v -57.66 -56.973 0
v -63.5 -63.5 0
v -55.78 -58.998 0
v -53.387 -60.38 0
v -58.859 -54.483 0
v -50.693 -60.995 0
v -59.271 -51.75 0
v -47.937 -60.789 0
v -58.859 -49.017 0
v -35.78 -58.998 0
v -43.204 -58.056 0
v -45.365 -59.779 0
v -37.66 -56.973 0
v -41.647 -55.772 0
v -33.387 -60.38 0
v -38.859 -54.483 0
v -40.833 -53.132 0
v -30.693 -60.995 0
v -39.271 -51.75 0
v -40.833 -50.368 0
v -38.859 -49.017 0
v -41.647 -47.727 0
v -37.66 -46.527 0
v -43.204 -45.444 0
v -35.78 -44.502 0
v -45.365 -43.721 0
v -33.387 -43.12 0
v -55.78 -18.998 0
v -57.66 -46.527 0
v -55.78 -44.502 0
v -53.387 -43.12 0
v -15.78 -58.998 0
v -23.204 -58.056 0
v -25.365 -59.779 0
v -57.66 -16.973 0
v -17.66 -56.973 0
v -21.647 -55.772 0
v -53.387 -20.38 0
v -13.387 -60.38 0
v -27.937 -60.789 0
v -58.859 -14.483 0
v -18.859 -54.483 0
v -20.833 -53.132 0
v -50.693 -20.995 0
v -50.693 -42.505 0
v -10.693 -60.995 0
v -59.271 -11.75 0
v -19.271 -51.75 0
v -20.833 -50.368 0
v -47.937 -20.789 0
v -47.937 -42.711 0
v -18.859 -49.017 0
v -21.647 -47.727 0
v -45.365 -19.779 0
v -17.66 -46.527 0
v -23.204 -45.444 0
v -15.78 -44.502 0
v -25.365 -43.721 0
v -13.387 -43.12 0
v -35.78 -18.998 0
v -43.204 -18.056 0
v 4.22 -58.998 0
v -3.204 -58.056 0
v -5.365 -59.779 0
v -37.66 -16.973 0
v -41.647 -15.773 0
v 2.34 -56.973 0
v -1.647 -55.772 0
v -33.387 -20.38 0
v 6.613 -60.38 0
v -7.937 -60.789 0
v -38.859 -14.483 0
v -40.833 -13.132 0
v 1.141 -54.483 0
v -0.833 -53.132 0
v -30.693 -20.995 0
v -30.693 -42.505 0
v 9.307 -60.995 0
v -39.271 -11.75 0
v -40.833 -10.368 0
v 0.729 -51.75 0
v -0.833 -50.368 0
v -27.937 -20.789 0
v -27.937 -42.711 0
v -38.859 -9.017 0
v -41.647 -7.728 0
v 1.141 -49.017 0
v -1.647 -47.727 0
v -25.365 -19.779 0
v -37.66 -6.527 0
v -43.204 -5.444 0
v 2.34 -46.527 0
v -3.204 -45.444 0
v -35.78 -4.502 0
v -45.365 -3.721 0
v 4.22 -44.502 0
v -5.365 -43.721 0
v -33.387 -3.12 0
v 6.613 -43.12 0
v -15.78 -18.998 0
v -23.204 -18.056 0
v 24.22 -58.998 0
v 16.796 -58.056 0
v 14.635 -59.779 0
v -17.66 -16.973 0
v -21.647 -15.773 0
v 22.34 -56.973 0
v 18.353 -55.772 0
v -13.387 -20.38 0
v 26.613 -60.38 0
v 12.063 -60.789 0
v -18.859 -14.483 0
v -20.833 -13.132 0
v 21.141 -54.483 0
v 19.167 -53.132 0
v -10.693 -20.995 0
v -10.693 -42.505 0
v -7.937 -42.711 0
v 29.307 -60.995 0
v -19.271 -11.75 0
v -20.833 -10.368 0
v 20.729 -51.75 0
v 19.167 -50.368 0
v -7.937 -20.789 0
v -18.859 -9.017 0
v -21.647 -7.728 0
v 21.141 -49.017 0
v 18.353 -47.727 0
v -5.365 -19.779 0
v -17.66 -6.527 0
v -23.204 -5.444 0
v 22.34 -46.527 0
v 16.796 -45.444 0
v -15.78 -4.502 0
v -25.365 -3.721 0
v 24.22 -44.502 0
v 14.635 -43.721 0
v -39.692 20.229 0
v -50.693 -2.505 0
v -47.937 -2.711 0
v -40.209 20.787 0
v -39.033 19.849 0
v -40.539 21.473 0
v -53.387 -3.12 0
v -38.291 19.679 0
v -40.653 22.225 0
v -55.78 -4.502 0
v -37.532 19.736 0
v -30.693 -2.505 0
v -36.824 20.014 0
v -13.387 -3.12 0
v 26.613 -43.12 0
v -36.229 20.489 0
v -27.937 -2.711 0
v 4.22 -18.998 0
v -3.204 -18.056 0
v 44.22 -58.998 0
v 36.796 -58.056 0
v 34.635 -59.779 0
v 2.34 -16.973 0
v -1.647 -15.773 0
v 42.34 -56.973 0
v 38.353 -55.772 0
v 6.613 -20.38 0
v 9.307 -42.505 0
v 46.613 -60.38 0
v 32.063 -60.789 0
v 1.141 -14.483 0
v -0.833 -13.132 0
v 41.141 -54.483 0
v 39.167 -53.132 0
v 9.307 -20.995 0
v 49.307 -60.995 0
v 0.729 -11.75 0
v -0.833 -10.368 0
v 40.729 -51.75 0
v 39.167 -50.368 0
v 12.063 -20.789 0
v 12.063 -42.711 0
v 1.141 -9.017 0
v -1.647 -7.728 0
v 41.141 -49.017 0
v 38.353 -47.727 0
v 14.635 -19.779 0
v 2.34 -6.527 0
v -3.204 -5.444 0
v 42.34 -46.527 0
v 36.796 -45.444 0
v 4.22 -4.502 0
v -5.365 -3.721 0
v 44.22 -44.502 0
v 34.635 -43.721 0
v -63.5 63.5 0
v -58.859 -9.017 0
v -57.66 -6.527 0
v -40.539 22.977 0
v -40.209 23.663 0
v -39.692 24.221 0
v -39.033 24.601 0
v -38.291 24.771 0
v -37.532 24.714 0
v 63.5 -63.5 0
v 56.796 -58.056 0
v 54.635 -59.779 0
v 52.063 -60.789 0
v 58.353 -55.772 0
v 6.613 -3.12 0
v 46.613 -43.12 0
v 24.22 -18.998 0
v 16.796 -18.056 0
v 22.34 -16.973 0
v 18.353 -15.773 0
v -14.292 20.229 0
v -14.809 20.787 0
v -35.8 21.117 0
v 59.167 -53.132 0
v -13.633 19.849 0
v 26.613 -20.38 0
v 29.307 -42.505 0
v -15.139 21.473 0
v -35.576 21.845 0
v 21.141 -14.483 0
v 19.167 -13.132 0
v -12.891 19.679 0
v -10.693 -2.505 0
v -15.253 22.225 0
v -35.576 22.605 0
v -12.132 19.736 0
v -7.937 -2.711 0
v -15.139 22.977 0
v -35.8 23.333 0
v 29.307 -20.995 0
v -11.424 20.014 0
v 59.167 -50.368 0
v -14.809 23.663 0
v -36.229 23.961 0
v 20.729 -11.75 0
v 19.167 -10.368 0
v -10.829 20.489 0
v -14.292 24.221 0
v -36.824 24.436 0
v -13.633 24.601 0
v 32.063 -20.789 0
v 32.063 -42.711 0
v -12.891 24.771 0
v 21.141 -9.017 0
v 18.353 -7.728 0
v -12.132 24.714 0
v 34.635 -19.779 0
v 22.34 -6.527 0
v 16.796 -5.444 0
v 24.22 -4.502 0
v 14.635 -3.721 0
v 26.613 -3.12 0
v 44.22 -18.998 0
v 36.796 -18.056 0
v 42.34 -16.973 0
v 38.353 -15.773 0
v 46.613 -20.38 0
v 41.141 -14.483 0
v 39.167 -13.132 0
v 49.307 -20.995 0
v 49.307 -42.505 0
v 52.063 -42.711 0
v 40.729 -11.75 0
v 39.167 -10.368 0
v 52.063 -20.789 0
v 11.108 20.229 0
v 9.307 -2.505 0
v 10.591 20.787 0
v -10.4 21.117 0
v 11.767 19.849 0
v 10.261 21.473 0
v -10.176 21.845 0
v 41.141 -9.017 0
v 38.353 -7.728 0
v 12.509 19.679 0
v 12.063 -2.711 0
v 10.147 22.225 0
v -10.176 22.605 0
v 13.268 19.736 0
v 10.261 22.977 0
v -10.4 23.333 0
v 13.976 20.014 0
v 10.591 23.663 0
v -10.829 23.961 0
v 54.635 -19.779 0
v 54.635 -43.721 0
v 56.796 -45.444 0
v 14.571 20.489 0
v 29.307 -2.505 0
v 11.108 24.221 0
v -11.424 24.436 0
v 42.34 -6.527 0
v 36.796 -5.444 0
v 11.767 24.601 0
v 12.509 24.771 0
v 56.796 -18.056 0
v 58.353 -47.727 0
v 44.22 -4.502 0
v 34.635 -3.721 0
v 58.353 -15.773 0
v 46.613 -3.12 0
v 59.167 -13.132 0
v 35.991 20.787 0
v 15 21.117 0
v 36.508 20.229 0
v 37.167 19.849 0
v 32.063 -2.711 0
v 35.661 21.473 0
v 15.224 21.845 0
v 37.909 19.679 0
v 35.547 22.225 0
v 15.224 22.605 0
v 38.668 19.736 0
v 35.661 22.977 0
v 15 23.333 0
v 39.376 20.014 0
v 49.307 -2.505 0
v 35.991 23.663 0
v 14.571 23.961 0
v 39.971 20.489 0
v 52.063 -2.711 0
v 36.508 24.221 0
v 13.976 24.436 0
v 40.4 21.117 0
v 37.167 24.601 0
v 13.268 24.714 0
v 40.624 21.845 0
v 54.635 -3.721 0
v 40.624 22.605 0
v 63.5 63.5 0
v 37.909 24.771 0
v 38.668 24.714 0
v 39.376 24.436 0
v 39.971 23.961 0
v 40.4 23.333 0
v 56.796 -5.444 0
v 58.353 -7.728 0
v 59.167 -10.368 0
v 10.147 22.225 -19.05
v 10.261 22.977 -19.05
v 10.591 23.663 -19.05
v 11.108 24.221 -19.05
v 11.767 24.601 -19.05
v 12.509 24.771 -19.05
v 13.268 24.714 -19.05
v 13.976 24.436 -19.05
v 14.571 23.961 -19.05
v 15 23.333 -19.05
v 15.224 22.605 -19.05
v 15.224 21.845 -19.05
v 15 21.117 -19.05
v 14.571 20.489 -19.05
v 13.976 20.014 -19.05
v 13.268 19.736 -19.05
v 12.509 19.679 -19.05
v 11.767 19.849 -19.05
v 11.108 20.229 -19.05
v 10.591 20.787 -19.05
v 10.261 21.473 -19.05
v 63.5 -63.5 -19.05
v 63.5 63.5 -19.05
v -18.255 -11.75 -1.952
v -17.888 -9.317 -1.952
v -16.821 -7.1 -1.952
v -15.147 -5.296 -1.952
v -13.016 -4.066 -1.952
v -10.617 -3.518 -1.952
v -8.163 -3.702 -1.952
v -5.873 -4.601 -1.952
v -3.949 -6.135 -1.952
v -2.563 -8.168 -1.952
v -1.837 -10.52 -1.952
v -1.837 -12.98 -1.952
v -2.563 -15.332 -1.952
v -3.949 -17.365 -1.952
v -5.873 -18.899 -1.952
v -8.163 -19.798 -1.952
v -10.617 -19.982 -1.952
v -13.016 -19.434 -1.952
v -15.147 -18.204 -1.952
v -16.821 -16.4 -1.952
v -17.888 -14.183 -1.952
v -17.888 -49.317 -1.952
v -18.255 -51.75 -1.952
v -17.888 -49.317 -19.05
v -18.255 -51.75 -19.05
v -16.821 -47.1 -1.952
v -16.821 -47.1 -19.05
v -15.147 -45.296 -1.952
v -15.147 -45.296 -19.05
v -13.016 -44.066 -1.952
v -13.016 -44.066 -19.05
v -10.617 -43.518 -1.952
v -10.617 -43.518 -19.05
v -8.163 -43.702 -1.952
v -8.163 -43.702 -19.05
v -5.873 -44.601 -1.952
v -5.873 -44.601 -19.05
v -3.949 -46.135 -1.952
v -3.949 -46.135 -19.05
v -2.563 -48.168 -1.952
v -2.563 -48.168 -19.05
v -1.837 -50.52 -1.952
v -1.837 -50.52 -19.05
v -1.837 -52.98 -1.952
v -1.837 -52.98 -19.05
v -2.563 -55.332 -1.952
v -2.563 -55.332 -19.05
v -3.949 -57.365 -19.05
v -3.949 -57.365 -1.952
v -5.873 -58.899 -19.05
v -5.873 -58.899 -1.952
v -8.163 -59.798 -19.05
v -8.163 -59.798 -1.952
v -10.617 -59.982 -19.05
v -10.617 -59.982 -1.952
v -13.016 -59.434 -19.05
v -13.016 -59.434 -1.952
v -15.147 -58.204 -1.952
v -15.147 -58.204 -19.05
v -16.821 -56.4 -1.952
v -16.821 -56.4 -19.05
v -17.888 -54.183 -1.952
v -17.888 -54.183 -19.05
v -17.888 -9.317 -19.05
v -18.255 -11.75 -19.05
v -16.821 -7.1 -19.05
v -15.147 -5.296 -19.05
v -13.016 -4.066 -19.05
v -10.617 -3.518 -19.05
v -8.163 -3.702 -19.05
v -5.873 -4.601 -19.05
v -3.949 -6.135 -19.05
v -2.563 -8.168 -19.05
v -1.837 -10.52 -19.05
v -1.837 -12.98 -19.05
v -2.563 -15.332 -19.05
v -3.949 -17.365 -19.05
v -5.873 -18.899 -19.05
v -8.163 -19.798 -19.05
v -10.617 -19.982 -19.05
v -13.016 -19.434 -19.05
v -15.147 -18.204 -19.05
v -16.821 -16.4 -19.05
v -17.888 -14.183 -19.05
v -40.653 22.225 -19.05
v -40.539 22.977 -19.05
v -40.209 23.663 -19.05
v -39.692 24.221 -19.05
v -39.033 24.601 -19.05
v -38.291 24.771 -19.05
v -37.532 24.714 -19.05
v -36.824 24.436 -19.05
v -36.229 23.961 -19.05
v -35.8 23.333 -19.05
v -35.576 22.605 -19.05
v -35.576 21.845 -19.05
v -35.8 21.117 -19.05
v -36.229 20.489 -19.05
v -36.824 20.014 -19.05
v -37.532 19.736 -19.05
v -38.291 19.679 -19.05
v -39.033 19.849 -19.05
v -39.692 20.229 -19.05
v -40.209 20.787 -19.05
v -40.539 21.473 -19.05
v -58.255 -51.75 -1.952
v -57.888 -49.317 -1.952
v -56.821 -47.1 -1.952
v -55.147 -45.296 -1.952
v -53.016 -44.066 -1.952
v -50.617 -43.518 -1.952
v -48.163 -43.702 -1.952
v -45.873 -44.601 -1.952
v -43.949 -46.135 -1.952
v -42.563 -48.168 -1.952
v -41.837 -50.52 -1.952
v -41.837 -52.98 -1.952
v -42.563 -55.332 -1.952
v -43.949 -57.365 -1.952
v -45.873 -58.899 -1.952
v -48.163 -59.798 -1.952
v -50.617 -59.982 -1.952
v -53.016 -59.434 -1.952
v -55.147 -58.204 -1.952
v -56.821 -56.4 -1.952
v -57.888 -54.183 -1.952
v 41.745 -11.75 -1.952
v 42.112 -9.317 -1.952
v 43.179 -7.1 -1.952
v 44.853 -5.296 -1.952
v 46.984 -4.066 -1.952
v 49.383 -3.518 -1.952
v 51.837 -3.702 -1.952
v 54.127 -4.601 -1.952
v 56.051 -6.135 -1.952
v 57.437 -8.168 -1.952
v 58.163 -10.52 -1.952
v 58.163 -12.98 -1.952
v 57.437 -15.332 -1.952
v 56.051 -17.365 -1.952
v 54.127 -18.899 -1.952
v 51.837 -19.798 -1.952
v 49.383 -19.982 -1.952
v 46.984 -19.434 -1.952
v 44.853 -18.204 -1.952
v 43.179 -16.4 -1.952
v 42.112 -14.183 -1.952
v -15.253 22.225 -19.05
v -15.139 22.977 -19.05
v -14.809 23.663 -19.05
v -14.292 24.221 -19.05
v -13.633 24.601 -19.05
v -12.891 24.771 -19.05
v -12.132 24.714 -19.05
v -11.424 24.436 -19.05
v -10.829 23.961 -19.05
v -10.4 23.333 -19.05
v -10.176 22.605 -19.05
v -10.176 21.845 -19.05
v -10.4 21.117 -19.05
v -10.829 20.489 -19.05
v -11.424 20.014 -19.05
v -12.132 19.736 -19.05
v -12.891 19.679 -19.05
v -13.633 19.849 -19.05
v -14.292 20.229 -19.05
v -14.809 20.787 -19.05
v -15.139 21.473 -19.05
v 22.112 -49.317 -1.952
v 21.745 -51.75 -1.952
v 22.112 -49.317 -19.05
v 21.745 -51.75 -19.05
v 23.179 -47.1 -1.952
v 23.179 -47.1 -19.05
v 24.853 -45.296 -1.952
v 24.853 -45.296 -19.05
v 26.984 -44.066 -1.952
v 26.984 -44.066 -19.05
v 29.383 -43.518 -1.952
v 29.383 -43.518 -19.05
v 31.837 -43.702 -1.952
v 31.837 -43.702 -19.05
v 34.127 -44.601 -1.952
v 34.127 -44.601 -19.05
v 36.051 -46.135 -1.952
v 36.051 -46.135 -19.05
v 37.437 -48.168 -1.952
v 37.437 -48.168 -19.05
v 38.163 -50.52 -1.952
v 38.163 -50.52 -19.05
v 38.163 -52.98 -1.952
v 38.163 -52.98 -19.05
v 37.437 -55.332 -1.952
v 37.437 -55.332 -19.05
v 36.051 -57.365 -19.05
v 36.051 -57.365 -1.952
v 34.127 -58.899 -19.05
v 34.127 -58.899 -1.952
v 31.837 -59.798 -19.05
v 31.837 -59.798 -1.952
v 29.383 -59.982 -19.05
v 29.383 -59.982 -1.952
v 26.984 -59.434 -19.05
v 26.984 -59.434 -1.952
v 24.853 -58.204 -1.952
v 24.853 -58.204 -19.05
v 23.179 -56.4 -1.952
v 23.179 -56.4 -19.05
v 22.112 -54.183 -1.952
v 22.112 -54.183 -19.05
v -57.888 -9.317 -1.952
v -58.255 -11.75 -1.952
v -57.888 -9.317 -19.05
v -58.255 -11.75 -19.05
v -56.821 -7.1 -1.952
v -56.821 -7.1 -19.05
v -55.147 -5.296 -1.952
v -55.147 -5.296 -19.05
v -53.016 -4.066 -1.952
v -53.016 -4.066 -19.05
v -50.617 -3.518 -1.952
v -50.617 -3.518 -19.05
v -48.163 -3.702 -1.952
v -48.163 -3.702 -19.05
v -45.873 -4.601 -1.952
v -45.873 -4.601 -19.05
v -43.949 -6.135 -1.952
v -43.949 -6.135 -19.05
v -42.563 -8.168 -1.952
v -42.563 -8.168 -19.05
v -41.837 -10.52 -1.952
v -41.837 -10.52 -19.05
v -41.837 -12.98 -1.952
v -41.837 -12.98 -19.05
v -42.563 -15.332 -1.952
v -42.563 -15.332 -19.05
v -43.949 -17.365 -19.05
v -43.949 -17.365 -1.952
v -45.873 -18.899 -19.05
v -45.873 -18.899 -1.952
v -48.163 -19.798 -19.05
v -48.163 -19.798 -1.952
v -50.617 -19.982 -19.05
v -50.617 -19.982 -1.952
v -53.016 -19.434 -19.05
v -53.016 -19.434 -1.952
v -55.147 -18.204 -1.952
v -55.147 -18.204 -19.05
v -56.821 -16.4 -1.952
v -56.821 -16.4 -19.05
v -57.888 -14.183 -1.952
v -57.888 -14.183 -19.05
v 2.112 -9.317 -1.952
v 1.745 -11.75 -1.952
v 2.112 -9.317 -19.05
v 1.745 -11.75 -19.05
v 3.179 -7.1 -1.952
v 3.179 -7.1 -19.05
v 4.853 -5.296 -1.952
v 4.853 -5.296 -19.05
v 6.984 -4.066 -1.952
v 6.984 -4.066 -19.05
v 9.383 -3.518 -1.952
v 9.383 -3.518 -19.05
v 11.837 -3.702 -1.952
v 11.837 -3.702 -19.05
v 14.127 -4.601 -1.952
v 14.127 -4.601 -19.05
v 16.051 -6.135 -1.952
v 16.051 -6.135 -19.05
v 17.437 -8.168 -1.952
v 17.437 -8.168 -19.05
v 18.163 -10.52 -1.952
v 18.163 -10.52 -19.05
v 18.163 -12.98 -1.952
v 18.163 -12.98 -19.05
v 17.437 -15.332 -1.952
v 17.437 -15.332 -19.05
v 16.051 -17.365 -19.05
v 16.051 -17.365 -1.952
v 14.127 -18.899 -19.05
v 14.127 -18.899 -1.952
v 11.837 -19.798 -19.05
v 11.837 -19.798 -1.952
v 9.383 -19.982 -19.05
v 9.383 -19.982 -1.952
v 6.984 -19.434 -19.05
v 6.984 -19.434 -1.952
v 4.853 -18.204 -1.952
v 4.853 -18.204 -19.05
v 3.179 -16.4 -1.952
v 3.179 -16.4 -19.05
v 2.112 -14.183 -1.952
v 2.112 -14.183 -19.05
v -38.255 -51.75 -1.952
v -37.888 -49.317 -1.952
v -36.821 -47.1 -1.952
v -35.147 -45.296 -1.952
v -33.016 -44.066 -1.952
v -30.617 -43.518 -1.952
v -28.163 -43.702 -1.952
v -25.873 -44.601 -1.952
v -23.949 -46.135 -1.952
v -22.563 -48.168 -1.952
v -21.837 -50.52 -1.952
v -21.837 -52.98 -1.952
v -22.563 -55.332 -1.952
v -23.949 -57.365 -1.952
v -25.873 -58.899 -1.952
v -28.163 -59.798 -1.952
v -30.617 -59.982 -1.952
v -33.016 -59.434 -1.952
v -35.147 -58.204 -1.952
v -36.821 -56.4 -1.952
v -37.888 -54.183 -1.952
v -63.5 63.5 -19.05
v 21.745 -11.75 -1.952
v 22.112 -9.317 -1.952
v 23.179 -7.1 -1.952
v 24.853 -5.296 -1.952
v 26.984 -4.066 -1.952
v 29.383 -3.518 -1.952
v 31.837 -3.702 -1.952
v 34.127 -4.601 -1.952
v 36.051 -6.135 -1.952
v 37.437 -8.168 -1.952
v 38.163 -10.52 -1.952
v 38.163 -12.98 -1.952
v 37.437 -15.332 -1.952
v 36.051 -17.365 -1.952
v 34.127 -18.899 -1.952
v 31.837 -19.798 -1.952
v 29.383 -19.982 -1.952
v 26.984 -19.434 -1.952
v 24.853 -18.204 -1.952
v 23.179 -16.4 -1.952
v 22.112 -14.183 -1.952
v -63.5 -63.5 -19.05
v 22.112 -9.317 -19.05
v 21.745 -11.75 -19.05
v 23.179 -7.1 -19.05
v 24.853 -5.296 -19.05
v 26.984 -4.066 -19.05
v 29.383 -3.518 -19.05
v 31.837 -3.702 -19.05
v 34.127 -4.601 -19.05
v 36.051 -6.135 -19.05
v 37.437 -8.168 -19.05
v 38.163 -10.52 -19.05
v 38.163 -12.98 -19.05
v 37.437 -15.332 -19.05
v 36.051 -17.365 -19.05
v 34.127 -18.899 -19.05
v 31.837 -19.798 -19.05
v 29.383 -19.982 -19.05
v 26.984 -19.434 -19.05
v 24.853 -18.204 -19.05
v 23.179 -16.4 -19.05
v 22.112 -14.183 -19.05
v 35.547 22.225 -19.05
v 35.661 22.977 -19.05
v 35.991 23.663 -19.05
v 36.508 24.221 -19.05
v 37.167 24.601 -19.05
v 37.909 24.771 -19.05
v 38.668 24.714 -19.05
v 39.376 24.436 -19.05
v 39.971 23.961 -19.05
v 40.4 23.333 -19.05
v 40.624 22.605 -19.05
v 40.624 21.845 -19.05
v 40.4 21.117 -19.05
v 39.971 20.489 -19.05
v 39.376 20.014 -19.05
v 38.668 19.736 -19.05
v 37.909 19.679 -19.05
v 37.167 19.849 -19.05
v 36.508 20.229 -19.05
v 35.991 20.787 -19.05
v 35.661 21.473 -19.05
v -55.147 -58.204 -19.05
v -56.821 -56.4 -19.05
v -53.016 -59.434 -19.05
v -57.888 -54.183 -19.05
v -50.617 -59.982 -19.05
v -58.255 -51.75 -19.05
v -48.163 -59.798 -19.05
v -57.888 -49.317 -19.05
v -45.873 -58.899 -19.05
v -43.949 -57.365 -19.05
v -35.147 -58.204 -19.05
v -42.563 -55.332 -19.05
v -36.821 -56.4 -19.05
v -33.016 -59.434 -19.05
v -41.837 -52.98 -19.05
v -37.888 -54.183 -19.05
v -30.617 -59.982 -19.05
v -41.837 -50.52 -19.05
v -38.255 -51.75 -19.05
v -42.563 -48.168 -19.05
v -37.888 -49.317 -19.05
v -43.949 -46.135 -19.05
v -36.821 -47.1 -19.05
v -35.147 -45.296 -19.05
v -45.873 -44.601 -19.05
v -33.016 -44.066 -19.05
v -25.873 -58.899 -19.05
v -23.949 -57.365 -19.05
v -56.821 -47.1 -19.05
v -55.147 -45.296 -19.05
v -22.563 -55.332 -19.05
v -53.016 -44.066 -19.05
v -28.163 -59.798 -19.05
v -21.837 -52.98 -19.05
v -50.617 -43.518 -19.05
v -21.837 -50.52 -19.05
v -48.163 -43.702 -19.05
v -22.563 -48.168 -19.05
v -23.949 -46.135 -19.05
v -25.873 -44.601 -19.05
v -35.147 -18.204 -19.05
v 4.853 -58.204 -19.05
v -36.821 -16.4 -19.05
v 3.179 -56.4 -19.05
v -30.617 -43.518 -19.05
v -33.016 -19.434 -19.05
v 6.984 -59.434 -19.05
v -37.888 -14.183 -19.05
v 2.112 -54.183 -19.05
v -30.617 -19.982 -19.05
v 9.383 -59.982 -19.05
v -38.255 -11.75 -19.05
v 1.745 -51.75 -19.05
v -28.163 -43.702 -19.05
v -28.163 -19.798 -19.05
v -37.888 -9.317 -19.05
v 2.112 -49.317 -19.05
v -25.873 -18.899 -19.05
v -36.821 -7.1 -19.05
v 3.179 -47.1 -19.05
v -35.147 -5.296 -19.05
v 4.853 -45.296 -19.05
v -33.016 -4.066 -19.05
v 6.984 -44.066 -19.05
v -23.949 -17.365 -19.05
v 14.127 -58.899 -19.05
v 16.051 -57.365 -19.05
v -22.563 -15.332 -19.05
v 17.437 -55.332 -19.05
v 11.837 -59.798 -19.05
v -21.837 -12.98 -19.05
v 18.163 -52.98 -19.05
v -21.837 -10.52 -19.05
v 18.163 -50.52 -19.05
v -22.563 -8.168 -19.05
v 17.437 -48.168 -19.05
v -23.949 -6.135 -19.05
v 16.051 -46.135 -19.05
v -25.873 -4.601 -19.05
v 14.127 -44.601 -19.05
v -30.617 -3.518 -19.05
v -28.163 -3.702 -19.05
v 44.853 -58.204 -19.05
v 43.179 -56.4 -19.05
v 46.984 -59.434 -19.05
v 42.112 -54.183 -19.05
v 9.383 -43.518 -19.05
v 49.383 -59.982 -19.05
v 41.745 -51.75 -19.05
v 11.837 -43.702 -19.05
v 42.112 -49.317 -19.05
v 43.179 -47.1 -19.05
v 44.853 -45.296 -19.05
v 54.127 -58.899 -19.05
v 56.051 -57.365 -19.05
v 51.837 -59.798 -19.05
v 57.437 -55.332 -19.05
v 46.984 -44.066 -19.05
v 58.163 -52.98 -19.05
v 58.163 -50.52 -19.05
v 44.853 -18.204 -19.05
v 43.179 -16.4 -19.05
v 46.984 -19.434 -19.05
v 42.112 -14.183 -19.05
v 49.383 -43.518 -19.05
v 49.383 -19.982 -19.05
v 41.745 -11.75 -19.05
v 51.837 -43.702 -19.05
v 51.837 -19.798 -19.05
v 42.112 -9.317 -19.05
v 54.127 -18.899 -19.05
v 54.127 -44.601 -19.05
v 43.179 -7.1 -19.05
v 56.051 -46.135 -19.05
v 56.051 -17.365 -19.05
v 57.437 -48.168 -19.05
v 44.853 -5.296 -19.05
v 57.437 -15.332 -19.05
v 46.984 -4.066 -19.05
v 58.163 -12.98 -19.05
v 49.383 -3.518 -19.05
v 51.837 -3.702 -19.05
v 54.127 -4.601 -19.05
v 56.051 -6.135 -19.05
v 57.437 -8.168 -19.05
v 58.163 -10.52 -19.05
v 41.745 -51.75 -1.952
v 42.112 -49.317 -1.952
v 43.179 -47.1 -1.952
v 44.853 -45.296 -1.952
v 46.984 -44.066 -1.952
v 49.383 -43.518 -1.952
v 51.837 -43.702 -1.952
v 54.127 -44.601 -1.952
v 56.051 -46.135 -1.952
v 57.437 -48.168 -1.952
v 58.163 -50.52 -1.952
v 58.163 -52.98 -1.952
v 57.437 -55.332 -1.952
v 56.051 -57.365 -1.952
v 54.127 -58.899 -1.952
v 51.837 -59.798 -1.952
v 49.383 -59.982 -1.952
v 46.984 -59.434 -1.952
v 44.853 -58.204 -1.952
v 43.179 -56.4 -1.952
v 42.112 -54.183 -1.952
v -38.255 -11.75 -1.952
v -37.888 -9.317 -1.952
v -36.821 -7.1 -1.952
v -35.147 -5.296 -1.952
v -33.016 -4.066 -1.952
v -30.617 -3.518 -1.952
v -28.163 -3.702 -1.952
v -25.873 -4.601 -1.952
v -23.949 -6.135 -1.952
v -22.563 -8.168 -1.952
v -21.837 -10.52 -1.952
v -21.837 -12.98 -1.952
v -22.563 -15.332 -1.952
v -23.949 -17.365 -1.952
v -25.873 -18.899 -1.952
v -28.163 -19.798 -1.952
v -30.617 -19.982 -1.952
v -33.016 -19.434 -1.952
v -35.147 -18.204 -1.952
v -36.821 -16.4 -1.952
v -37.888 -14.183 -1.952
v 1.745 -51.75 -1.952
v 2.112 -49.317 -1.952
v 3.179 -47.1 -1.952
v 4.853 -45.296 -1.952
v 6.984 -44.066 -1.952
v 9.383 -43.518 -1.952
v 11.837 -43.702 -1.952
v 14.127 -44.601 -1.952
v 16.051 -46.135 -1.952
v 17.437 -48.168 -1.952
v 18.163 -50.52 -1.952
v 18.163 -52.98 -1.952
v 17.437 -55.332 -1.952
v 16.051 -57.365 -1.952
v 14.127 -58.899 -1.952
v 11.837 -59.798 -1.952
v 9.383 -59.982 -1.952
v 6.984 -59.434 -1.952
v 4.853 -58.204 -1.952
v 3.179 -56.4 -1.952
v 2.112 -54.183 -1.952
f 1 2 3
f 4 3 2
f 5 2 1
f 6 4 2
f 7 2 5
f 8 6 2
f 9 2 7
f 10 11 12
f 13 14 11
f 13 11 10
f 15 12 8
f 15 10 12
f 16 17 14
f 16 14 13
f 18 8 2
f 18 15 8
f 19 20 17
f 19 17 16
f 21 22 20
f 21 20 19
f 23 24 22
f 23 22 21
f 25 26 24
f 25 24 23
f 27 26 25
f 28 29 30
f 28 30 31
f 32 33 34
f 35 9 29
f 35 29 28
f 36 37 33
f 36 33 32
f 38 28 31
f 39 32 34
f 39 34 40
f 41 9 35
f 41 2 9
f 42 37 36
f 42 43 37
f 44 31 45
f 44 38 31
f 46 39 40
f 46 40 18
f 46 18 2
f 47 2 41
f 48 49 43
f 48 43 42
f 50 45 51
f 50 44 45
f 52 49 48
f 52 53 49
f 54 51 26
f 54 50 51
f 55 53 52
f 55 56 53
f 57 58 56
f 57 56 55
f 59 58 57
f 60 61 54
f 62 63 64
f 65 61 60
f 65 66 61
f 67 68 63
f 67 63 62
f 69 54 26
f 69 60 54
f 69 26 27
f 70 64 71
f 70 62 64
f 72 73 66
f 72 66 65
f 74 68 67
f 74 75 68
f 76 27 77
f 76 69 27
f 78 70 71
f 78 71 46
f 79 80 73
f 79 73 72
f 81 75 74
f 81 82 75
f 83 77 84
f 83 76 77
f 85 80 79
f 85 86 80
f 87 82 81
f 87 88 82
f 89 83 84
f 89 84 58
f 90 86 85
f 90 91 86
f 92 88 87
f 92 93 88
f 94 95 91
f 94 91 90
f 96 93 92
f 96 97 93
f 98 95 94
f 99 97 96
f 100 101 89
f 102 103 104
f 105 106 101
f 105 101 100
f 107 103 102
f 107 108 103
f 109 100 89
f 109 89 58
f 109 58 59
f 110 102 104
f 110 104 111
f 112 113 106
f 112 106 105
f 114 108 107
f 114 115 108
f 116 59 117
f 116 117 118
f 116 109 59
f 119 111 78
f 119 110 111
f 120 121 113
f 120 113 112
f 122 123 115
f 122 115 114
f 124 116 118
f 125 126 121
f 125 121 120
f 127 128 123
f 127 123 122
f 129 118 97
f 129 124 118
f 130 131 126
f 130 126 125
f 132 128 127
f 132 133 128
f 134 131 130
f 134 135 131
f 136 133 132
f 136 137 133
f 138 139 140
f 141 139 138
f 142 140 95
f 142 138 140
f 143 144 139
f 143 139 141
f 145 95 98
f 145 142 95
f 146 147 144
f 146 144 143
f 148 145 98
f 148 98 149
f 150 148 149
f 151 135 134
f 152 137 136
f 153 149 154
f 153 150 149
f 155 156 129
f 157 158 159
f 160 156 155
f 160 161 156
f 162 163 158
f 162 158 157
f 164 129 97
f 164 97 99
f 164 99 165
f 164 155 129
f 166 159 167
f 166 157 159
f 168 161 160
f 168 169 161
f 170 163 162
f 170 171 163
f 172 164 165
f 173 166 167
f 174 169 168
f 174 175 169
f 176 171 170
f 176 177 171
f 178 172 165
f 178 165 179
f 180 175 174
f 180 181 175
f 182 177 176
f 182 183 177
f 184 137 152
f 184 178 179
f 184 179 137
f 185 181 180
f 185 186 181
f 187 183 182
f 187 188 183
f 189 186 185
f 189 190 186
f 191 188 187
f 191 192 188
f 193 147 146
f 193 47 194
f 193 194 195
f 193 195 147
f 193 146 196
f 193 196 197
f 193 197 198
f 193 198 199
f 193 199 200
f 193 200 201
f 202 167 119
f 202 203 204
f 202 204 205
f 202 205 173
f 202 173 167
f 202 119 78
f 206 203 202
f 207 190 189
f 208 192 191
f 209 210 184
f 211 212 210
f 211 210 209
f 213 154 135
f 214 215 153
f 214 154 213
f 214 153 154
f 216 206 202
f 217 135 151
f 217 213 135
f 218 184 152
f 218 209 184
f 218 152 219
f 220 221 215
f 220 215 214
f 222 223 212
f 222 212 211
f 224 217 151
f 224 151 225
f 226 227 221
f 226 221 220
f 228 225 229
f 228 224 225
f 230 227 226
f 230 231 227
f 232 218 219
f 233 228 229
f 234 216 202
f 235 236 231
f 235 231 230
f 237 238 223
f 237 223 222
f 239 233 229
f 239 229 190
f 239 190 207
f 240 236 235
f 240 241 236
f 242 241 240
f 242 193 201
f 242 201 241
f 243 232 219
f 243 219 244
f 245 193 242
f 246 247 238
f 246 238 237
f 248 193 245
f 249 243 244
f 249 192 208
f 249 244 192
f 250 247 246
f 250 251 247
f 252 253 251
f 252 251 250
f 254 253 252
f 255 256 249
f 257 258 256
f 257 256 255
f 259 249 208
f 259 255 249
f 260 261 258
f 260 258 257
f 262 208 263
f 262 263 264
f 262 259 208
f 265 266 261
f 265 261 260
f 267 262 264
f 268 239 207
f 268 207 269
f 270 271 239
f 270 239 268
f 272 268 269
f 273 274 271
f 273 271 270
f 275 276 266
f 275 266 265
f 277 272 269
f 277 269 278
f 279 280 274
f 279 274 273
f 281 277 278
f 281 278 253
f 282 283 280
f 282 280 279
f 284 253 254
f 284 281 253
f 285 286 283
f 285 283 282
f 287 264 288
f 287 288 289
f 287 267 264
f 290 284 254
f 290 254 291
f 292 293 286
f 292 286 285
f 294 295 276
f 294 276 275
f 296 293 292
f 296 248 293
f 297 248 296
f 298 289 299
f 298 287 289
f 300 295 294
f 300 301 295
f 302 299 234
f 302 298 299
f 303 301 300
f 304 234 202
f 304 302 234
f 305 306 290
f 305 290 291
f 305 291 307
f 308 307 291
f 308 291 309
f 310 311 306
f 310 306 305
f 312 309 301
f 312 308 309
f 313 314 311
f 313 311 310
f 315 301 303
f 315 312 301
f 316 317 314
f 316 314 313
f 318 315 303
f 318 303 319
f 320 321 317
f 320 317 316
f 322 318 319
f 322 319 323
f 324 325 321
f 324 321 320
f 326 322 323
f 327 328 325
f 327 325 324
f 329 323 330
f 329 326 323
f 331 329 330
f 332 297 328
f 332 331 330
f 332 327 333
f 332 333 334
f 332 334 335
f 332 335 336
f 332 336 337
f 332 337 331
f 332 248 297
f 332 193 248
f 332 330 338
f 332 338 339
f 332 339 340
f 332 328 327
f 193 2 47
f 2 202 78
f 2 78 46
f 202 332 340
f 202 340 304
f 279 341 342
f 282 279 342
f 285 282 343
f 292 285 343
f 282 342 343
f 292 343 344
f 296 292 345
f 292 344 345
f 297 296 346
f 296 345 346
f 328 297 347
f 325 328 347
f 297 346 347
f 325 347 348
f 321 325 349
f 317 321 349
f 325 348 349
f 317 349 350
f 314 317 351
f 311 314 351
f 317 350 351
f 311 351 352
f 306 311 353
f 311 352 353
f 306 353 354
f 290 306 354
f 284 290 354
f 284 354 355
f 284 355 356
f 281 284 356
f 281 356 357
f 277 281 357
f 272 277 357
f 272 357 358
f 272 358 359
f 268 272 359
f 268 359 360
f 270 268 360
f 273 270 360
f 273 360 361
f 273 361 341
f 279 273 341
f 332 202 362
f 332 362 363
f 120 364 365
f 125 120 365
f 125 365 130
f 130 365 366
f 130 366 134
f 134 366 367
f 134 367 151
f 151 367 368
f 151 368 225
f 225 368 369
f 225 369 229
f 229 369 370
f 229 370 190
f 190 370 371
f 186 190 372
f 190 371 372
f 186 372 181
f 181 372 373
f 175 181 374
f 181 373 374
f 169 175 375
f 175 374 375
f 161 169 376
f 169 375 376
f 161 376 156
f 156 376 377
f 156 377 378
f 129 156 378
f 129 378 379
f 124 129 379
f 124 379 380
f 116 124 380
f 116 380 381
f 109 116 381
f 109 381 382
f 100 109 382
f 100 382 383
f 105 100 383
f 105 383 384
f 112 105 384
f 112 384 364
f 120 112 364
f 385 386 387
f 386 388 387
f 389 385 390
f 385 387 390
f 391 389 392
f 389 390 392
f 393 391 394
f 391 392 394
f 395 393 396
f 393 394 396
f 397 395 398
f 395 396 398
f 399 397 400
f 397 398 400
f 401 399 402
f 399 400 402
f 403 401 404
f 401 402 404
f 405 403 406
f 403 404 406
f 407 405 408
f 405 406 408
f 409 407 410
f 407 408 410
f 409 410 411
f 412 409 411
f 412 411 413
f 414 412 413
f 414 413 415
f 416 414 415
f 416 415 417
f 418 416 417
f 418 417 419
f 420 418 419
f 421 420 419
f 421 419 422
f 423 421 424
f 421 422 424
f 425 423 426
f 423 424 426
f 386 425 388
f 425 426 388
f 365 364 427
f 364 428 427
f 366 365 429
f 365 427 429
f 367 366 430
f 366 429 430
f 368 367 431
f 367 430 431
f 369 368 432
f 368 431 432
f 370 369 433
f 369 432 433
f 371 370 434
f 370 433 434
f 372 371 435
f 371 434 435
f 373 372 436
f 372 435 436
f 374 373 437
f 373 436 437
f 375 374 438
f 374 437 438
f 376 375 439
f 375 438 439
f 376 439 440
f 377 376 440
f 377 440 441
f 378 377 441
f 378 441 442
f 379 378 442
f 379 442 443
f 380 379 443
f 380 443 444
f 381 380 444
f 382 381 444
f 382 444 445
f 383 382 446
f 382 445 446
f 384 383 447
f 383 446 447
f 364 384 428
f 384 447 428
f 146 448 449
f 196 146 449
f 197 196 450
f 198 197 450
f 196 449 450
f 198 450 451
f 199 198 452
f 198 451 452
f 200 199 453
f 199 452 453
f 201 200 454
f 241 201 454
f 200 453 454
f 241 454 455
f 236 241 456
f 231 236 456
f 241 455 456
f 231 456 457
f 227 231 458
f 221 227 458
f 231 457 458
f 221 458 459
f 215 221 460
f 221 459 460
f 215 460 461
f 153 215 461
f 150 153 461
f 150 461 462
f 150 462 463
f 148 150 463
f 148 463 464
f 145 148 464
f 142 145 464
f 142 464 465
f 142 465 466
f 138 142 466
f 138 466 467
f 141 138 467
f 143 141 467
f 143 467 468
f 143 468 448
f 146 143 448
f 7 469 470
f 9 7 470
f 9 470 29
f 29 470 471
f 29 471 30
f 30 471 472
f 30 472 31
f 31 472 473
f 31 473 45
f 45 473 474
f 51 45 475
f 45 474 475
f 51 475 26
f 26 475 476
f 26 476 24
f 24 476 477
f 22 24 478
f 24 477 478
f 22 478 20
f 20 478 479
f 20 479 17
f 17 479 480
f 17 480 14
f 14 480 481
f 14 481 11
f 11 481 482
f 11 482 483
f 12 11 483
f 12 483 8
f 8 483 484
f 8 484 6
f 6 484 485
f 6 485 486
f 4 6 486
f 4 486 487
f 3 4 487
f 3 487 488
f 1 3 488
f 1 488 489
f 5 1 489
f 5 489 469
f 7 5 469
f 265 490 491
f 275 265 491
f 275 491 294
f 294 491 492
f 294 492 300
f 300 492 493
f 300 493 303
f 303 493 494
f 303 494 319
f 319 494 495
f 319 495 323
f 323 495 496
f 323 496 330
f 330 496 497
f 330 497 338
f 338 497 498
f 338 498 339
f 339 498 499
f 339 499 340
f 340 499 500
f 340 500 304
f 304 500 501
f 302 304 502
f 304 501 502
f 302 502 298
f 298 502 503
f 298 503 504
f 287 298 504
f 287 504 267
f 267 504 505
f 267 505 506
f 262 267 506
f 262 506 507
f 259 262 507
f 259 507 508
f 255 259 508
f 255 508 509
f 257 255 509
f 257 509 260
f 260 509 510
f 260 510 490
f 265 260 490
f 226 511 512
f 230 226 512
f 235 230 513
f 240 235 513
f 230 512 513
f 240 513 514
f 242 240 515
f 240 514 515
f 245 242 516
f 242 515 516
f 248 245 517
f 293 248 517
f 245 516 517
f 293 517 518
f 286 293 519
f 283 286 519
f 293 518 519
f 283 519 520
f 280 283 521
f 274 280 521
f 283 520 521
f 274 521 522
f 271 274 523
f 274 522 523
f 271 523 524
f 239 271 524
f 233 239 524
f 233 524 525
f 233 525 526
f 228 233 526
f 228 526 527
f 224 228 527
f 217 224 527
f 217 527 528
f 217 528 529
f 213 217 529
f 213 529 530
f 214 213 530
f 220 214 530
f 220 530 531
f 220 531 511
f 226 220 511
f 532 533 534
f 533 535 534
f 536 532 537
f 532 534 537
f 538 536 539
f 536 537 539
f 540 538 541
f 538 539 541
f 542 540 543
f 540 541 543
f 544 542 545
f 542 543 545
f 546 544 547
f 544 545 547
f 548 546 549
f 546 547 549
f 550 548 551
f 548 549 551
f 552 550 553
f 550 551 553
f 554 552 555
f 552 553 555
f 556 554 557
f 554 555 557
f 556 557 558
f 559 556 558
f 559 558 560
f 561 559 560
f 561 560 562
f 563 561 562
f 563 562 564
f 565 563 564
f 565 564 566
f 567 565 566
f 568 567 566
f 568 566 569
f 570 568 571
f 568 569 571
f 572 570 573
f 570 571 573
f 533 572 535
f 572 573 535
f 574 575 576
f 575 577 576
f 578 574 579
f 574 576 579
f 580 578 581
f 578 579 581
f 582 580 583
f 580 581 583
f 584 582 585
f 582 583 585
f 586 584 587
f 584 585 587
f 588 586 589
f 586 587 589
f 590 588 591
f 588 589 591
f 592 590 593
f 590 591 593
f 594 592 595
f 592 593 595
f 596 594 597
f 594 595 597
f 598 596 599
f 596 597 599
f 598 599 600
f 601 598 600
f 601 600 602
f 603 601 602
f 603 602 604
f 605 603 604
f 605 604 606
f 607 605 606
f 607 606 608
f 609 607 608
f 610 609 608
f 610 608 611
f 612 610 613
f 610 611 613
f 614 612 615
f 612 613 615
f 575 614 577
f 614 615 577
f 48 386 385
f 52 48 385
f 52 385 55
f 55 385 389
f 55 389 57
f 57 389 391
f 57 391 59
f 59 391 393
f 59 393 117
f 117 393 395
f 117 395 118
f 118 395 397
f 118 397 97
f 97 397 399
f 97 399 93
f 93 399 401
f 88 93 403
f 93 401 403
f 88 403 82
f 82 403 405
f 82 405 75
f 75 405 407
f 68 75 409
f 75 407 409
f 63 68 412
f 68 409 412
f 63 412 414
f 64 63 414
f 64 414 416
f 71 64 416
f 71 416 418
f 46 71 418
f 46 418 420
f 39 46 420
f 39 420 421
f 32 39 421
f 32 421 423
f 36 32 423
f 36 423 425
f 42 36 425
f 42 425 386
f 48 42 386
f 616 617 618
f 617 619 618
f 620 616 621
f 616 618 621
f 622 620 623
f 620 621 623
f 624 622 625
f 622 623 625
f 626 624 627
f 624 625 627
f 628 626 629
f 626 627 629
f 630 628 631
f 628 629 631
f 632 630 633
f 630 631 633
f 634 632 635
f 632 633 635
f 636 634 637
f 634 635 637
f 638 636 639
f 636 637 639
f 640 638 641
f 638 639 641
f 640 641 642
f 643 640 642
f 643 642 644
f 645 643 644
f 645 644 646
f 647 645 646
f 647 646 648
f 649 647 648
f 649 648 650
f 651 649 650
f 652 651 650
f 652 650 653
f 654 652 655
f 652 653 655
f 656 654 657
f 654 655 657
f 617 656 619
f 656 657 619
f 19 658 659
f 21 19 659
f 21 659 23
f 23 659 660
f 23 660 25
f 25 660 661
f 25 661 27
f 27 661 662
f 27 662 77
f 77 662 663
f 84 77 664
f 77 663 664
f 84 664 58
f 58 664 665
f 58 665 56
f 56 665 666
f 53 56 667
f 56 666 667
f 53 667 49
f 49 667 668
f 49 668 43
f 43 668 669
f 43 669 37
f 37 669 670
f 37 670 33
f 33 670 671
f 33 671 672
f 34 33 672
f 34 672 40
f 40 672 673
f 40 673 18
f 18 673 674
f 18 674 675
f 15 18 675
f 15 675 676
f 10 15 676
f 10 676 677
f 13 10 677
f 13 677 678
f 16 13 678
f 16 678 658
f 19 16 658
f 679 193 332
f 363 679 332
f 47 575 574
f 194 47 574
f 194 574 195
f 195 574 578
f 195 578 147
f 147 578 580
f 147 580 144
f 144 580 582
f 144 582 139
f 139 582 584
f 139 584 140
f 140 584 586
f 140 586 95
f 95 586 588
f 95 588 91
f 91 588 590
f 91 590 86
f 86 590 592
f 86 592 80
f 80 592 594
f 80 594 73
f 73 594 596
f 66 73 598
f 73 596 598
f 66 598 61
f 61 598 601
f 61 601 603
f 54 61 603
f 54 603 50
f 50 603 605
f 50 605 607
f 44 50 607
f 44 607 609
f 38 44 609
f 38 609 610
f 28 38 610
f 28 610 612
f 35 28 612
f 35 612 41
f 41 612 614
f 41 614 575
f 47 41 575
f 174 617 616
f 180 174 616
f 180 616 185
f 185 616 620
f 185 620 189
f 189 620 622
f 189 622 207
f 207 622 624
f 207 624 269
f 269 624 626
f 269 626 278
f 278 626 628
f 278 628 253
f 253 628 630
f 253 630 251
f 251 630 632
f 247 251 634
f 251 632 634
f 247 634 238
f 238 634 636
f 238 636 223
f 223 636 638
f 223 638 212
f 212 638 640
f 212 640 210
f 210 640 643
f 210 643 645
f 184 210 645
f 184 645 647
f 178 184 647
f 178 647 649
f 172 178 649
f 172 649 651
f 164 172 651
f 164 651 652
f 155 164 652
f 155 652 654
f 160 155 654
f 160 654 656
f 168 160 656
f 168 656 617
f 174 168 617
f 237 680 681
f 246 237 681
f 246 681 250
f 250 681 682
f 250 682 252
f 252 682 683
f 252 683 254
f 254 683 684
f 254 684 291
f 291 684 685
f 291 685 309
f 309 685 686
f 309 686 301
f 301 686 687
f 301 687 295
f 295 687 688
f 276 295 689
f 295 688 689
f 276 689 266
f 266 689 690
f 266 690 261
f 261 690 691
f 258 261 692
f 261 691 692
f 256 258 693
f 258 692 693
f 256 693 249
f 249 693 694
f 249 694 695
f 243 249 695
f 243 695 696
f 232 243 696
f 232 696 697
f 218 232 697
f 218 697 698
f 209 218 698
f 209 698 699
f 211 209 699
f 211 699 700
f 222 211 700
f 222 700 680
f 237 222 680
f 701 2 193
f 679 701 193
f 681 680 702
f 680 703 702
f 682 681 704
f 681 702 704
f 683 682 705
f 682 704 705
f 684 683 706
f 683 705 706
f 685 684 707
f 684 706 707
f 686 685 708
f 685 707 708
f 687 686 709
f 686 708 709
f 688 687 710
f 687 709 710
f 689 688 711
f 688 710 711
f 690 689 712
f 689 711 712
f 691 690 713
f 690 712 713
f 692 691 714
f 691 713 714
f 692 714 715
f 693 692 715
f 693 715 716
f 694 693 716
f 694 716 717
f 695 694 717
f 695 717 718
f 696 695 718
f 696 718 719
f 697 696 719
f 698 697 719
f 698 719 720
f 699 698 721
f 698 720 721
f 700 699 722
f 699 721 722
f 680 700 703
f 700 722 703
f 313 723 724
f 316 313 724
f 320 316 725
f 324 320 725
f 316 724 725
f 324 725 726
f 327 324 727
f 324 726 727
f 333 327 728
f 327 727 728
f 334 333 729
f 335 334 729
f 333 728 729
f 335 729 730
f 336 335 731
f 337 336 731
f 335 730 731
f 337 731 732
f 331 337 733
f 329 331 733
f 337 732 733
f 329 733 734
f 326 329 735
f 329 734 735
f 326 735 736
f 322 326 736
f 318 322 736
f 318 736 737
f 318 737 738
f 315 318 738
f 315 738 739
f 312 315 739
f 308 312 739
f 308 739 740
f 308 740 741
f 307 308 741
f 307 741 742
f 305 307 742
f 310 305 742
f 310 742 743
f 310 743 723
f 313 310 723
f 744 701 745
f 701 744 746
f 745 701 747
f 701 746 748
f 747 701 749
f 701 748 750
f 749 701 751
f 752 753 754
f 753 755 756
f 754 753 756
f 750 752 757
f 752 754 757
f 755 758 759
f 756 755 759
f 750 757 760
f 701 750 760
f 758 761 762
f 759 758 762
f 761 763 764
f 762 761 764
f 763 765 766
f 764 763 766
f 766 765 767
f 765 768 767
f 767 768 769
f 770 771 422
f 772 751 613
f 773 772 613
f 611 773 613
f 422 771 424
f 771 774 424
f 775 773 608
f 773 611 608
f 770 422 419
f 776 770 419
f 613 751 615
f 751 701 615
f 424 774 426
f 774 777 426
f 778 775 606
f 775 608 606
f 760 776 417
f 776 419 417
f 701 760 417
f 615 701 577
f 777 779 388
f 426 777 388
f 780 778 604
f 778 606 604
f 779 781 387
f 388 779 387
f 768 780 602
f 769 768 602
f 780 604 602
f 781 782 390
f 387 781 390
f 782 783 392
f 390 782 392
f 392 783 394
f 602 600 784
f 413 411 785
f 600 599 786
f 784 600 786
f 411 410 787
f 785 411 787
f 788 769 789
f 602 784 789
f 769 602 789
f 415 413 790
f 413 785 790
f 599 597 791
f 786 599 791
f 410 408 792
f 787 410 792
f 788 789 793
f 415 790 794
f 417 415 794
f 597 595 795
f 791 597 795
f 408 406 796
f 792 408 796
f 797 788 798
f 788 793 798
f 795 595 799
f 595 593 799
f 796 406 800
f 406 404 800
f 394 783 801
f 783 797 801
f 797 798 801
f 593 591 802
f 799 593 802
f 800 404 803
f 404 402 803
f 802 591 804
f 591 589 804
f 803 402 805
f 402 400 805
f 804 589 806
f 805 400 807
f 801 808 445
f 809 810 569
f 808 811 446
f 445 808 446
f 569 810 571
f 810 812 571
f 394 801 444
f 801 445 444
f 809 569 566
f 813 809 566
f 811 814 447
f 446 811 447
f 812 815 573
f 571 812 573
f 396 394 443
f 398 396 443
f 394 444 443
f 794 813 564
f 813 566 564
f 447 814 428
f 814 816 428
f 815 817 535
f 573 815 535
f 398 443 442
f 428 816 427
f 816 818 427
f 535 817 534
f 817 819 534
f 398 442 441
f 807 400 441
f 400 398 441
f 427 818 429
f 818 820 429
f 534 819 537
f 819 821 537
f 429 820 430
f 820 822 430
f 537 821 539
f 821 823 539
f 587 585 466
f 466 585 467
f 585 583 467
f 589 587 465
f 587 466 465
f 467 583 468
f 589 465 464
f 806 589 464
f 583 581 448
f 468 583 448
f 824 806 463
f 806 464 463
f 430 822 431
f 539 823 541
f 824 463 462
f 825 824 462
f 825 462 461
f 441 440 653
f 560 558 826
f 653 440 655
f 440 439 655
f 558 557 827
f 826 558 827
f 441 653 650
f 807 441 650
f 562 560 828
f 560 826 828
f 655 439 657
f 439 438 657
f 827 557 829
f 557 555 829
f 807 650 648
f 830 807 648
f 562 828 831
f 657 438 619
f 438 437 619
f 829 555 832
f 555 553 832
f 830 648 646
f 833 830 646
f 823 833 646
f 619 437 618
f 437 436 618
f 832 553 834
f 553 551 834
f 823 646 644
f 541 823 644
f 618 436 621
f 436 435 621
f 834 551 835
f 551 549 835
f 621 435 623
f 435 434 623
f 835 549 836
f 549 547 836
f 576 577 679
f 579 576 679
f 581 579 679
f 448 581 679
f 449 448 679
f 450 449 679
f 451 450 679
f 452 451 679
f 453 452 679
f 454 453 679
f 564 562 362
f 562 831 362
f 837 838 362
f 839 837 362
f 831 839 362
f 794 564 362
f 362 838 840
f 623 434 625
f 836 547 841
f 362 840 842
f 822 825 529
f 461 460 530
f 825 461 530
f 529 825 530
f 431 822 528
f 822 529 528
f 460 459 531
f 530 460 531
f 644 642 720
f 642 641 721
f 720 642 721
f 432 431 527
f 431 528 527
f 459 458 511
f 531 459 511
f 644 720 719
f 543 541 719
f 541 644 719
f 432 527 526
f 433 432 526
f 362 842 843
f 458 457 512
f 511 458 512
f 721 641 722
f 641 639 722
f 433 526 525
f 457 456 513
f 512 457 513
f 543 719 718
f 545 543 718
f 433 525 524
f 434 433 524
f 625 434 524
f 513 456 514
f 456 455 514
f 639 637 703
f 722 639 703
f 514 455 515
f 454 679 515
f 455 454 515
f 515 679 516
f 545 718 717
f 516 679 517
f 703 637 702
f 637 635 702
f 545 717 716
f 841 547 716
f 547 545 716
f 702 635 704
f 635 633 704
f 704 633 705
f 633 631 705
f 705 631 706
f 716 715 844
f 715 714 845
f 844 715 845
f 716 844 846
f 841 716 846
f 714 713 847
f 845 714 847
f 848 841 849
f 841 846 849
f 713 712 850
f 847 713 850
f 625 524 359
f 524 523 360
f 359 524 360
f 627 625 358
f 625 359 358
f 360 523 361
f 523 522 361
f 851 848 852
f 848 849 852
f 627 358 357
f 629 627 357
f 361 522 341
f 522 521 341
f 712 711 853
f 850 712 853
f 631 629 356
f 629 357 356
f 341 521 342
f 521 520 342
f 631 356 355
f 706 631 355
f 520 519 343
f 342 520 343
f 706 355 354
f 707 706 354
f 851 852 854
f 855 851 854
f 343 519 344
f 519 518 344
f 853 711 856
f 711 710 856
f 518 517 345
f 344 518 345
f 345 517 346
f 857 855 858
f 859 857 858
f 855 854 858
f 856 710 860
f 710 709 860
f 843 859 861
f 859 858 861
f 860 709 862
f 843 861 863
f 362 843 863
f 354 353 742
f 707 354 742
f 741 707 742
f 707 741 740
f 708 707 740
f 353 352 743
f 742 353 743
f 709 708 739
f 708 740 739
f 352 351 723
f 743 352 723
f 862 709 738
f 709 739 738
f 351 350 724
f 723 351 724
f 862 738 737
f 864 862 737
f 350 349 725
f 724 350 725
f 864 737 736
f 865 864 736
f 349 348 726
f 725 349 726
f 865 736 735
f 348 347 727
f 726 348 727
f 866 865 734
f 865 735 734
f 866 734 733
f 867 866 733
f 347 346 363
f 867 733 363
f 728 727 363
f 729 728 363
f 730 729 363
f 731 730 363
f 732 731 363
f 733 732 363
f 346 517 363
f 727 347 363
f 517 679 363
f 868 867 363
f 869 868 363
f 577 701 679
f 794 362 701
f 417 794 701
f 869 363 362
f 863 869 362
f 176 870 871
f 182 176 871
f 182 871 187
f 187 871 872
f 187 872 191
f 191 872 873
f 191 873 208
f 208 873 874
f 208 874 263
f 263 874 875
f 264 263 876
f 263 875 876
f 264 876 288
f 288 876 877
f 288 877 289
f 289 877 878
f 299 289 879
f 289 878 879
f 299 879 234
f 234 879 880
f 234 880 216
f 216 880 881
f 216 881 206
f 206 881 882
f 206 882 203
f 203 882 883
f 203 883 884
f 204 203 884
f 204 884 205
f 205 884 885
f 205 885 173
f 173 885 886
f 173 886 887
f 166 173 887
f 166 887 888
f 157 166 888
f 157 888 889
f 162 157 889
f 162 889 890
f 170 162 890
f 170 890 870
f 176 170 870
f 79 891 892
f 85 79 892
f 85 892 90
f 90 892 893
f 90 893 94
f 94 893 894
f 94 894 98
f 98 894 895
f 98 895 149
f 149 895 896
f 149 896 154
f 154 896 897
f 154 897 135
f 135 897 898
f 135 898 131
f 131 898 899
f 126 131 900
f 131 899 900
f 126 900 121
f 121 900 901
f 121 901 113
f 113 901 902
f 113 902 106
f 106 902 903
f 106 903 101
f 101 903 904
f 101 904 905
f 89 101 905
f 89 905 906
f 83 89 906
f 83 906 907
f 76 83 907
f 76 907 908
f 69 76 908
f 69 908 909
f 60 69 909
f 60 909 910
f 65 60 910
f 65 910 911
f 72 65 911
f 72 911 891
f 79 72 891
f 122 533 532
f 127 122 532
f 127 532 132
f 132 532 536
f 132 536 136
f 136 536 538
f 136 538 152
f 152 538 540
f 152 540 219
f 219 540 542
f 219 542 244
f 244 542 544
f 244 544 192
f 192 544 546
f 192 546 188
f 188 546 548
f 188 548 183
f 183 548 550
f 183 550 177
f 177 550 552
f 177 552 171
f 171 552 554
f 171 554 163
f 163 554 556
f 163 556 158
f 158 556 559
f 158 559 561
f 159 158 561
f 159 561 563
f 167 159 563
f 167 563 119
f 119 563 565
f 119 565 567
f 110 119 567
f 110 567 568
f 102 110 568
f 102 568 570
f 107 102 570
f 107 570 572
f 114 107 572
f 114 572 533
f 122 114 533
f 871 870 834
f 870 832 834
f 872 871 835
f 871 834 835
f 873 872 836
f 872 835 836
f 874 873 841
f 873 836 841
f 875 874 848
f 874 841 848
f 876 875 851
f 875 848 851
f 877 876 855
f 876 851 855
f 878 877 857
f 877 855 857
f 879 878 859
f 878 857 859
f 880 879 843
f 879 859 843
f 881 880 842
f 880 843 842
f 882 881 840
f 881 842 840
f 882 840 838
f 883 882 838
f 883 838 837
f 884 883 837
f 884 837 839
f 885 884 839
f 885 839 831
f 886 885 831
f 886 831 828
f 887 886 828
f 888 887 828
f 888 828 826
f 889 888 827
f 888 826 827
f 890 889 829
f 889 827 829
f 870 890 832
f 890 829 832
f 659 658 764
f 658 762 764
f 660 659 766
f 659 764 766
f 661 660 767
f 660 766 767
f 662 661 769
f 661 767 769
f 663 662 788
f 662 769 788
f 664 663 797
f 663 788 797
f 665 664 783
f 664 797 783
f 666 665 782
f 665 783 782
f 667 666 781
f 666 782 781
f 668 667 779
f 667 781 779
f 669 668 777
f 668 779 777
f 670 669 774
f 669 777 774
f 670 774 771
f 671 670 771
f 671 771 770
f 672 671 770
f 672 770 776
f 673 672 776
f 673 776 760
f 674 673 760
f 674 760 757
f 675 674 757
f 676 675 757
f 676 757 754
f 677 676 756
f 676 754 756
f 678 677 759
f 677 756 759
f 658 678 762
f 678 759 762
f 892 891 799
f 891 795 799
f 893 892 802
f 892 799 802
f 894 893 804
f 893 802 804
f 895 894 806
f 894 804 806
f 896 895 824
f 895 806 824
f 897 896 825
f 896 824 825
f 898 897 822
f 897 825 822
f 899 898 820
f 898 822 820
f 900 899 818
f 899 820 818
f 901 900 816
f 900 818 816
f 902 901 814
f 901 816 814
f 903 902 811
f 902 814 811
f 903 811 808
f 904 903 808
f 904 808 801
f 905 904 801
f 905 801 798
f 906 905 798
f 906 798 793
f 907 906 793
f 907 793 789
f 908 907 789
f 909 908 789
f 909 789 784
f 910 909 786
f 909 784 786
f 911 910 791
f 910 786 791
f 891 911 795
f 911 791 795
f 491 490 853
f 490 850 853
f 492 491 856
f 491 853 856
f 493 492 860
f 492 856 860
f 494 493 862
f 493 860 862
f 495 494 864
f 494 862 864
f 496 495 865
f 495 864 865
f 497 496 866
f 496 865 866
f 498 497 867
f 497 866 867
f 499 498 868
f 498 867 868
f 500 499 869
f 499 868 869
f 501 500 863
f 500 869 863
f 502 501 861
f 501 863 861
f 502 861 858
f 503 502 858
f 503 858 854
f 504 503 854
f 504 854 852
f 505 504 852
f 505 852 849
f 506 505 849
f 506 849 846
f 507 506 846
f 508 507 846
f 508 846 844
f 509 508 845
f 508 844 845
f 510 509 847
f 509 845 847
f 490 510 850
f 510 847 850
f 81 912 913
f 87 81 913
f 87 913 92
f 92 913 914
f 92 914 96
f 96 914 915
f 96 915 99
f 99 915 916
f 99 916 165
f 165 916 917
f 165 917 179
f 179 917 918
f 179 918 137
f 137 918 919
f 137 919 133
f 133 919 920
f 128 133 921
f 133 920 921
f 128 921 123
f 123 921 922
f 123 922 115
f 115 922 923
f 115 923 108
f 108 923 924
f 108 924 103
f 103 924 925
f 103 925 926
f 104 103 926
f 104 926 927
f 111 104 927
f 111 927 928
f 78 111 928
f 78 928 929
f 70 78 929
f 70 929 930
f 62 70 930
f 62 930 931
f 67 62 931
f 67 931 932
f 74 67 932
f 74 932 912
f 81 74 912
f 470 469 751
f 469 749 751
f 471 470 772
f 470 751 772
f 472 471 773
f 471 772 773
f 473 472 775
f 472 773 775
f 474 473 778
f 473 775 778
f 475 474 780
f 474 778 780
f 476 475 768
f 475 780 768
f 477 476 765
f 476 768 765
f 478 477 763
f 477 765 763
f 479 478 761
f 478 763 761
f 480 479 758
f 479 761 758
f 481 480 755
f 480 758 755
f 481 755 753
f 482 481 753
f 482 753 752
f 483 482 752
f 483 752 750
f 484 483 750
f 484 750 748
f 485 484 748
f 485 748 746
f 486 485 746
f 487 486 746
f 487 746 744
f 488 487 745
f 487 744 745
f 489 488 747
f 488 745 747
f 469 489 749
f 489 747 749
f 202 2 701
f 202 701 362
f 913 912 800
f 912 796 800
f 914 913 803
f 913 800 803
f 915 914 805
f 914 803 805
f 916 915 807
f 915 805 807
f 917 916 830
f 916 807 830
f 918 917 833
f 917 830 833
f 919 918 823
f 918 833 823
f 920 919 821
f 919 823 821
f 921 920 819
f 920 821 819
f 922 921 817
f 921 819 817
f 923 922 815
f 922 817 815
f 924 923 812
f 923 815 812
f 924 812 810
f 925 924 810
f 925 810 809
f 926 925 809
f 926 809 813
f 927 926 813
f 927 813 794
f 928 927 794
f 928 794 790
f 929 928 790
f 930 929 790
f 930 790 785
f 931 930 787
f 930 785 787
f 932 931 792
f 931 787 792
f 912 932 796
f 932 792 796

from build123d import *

# Parameters (mm, degrees)
F0_W           = 127
F0_H           = 127
F0_R           = 8.255
F0_R_2         = 3.175
F1_DEPTH       = 19.05
F2_D           = 5.1054
F3_D           = 16.51
F3_CSINK_D     = 18.542
F3_CSINK_ANGLE = 55


with BuildPart() as f1:
    # F0 (on Top) → F1 (new body)
    with BuildSketch(Plane.XY):
        Rectangle(F0_W, F0_H)
        with Locations((-50.0000905, -51.74996)):
            Circle(F0_R, mode=Mode.SUBTRACT)
        with Locations((-30.0000924, -51.74996)):
            Circle(F0_R, mode=Mode.SUBTRACT)
        with Locations((-10.0000943, -51.74996)):
            Circle(F0_R, mode=Mode.SUBTRACT)
        with Locations((-50.0000905, -11.75004)):
            Circle(F0_R, mode=Mode.SUBTRACT)
        with Locations((-30.0000924, -11.75004)):
            Circle(F0_R, mode=Mode.SUBTRACT)
        with Locations((-10.0000943, -11.75004)):
            Circle(F0_R, mode=Mode.SUBTRACT)
        with Locations((9.9999038, -51.74996)):
            Circle(F0_R, mode=Mode.SUBTRACT)
        with Locations((29.9999019, -51.74996)):
            Circle(F0_R, mode=Mode.SUBTRACT)
        with Locations((49.9999, -51.74996)):
            Circle(F0_R, mode=Mode.SUBTRACT)
        with Locations((9.9999038, -11.75004)):
            Circle(F0_R, mode=Mode.SUBTRACT)
        with Locations((29.9999019, -11.75004)):
            Circle(F0_R, mode=Mode.SUBTRACT)
        with Locations((49.9999, -11.75004)):
            Circle(F0_R, mode=Mode.SUBTRACT)
        with Locations((-38.1, 22.225)):
            Circle(F0_R_2, mode=Mode.SUBTRACT)
        with Locations((-12.7, 22.225)):
            Circle(F0_R_2, mode=Mode.SUBTRACT)
        with Locations((12.7, 22.225)):
            Circle(F0_R_2, mode=Mode.SUBTRACT)
        with Locations((38.1, 22.225)):
            Circle(F0_R_2, mode=Mode.SUBTRACT)
        with Locations((-38.1, 22.225)):
            Circle(F0_R_2)
        with Locations((-12.7, 22.225)):
            Circle(F0_R_2)
        with Locations((12.7, 22.225)):
            Circle(F0_R_2)
        with Locations((38.1, 22.225)):
            Circle(F0_R_2)
        with Locations((49.9999, -11.75004)):
            Circle(F0_R)
        with Locations((29.9999019, -11.75004)):
            Circle(F0_R)
        with Locations((9.9999038, -11.75004)):
            Circle(F0_R)
        with Locations((-10.0000943, -11.75004)):
            Circle(F0_R)
        with Locations((-30.0000924, -11.75004)):
            Circle(F0_R)
        with Locations((-50.0000905, -11.75004)):
            Circle(F0_R)
        with Locations((-50.0000905, -51.74996)):
            Circle(F0_R)
        with Locations((-30.0000924, -51.74996)):
            Circle(F0_R)
        with Locations((-10.0000943, -51.74996)):
            Circle(F0_R)
        with Locations((9.9999038, -51.74996)):
            Circle(F0_R)
        with Locations((29.9999019, -51.74996)):
            Circle(F0_R)
        with Locations((49.9999, -51.74996)):
            Circle(F0_R)
    extrude(amount=-F1_DEPTH)

    # F2 (through all)
    with Locations(Plane.XY):
        with Locations((-38.1, 22.225), (-12.7, 22.225), (12.7, 22.225), (38.1, 22.225)):
            Hole(F2_D / 2)

    # F3 (through all)
    with Locations(Plane.XY):
        with Locations((-50.0000905, -11.75004), (-30.0000924, -11.75004), (-10.0000943, -11.75004), (9.9999038, -11.75004), (29.9999019, -11.75004), (49.9999, -11.75004), (49.9999, -51.74996), (29.9999019, -51.74996), (9.9999038, -51.74996), (-10.0000943, -51.74996), (-30.0000924, -51.74996), (-50.0000905, -51.74996)):
            CounterSinkHole(F3_D / 2, F3_CSINK_D / 2, counter_sink_angle=F3_CSINK_ANGLE)


solid = f1.part
